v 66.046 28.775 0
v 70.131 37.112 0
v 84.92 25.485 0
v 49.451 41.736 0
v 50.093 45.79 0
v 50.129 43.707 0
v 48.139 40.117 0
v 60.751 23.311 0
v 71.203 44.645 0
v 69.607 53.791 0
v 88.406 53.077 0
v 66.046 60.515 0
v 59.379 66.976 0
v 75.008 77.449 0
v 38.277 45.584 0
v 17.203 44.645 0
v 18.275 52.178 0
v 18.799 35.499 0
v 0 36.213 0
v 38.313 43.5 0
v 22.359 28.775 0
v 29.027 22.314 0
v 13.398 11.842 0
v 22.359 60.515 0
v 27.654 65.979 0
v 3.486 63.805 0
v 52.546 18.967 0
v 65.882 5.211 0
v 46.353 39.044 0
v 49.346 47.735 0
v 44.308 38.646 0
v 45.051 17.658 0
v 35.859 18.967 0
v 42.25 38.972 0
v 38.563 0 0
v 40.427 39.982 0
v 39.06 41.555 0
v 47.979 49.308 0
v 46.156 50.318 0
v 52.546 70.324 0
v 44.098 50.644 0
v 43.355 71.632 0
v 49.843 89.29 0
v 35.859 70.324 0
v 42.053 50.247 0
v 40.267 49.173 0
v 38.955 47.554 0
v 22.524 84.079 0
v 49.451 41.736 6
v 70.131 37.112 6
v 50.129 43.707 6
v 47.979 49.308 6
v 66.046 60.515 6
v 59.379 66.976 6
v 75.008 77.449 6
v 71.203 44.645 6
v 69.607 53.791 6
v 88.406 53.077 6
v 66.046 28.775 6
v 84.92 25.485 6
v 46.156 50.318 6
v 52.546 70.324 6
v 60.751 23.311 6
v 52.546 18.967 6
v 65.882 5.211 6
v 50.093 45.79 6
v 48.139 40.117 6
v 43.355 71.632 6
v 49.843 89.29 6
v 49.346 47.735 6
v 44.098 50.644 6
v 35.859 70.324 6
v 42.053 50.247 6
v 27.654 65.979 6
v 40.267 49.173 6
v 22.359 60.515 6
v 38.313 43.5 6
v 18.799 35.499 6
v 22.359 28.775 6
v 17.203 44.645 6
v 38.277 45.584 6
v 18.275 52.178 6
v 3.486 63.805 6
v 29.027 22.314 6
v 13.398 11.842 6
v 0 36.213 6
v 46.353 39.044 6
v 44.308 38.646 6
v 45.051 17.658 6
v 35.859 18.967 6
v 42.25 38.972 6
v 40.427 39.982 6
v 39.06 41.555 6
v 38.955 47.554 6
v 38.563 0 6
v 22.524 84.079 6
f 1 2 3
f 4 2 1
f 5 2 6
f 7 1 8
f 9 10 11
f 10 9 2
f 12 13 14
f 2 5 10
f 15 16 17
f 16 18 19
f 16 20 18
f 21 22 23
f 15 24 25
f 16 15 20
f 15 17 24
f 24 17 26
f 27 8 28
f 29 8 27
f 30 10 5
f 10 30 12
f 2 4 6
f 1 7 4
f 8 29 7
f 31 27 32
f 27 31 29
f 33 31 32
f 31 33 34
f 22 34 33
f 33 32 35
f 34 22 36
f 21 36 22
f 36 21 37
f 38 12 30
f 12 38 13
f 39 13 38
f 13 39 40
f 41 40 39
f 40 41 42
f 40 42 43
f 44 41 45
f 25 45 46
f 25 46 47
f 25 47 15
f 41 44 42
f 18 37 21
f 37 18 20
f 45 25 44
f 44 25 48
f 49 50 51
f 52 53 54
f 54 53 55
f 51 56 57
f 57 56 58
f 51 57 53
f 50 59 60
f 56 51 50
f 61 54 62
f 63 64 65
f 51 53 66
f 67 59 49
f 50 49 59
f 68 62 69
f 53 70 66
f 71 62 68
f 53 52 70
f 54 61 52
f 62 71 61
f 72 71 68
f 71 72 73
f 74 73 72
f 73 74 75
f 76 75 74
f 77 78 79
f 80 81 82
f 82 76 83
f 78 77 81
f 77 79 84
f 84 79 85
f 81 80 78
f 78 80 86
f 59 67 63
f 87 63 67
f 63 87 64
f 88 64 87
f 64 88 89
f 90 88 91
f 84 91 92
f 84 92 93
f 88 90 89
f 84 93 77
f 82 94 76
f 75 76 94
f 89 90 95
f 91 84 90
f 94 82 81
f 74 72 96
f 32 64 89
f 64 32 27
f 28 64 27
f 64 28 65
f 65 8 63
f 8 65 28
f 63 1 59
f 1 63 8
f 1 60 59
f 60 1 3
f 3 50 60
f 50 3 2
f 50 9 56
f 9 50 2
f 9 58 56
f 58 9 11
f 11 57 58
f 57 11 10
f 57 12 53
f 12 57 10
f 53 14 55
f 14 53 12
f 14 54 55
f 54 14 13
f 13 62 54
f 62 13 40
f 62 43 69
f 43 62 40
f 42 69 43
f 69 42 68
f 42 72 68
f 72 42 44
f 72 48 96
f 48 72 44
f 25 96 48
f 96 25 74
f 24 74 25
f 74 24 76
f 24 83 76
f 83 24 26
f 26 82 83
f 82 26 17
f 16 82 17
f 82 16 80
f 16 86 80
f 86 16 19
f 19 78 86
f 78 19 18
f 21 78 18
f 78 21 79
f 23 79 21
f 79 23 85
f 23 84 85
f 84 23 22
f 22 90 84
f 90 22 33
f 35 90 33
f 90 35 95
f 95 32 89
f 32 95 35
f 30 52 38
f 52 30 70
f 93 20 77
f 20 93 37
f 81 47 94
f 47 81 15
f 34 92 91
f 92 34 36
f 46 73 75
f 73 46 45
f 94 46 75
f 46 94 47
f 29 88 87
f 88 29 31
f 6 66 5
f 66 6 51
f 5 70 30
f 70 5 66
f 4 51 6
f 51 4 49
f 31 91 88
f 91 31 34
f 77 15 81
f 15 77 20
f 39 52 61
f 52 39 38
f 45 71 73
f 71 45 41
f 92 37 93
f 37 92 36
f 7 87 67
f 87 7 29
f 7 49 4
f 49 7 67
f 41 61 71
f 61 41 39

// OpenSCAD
$fn = 32;

// ----------------------------------------------------------------------
// Star wheel: 10-point ratchet, R45
// ----------------------------------------------------------------------

// --- parameters (mm) ---
n_points = 10;            // number of points / teeth
r_out = 45;               // tip radius
r_in = 27;                // root radius
bore_r = 6;               // centre bore radius
plate_t = 6;              // plate thickness, Z (extrusion height)
bore_d = 12;              // centre bore diameter

profile = [[71.203, 44.645], [88.406, 53.077], [69.607, 53.791], [66.046, 60.515], [75.008, 77.449], [59.379, 66.976], [52.546, 70.324], [49.843, 89.29], [43.355, 71.632], [35.859, 70.324], [22.524, 84.079], [27.654, 65.979], [22.359, 60.515], [3.486, 63.805], [18.275, 52.178], [17.203, 44.645], [0, 36.213], [18.799, 35.499], [22.359, 28.775], [13.398, 11.842], [29.027, 22.314], [35.859, 18.967], [38.563, 0], [45.051, 17.658], [52.546, 18.967], [65.882, 5.211], [60.751, 23.311], [66.046, 28.775], [84.92, 25.485], [70.131, 37.112]];  // primary outline, 30 points, counter clockwise
void_1 = [[50.093, 45.79], [49.346, 47.735], [47.979, 49.308], [46.156, 50.318], [44.098, 50.644], [42.053, 50.247], [40.267, 49.173], [38.955, 47.554], [38.277, 45.584], [38.313, 43.5], [39.06, 41.555], [40.427, 39.982], [42.25, 38.972], [44.308, 38.646], [46.353, 39.044], [48.139, 40.117], [49.451, 41.736], [50.129, 43.707]];  // centre bore, 18 points

// --- the one profile operation ---
difference() {
  linear_extrude(height = plate_t) polygon(points = profile);
  translate([0, 0, -1])
    linear_extrude(height = plate_t + 2) polygon(points = void_1);
}
